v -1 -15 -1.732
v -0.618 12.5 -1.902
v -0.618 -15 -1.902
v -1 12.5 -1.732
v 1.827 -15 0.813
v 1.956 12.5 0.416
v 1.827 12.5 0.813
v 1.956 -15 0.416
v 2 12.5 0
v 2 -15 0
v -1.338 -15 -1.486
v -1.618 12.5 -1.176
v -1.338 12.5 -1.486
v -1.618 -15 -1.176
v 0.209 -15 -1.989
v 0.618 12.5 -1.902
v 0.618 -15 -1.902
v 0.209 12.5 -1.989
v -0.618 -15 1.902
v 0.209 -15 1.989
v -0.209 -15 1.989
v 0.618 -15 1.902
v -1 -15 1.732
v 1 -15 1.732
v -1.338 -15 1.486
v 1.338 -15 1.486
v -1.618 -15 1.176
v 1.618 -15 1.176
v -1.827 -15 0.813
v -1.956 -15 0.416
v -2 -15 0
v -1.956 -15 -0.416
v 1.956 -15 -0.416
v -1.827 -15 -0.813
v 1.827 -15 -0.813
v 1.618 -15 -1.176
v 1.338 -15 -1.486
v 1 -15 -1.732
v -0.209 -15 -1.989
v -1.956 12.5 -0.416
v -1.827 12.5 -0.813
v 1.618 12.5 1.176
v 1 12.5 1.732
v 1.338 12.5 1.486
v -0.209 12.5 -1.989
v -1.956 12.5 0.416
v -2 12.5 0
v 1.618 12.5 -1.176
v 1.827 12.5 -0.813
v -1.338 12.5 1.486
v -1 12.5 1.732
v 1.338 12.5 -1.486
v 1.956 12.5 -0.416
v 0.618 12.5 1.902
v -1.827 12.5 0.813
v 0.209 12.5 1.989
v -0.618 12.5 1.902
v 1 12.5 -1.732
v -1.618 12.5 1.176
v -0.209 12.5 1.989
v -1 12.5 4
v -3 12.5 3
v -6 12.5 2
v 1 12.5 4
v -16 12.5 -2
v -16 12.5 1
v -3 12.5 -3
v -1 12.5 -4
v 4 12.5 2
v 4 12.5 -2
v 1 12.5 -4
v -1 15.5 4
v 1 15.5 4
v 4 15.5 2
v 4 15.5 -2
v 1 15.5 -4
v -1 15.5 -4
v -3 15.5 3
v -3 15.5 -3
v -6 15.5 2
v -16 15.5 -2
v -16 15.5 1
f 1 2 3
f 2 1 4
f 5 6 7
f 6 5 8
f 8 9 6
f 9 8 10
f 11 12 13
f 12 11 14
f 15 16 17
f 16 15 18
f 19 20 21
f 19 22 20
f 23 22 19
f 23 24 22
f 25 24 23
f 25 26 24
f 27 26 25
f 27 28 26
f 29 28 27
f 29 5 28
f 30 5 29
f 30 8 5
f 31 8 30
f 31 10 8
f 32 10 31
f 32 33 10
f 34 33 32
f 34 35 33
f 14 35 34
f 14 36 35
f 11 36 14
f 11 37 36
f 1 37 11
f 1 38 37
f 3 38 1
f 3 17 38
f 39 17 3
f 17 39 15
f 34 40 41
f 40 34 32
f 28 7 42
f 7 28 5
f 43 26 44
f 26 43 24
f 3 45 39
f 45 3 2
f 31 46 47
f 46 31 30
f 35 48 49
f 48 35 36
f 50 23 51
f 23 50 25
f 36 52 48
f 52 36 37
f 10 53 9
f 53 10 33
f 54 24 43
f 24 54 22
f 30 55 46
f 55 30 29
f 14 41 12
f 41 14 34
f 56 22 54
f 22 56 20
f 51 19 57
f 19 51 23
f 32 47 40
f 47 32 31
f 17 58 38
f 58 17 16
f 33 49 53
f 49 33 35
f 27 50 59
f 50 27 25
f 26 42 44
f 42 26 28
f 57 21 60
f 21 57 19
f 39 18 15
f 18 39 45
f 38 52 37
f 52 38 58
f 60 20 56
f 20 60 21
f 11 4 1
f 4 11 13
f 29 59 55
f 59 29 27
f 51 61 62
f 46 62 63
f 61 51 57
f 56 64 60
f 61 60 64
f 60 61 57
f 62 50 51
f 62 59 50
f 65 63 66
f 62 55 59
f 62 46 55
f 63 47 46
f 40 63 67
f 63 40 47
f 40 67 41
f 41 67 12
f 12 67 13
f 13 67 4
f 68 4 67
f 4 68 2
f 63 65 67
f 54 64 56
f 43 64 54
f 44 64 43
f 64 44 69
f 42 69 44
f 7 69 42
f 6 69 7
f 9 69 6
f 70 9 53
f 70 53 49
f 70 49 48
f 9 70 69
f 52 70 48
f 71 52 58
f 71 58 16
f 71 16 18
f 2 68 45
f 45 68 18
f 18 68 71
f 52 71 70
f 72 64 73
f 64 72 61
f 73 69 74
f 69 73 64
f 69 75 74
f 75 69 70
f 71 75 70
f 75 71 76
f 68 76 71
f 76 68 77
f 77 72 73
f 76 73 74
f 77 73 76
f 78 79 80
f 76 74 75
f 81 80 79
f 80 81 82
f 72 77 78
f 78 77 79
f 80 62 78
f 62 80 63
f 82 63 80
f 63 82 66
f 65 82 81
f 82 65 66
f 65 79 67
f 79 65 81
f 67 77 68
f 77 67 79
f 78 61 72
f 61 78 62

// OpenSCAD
module Lever_Handle(){

    color("white")
       rotate([90,0,0])  
       translate([0,0,0])
       cylinder(30,2,2, $fn = 30, center = true); 
      
     
    color("gray")
    translate([-1,14,-1])
    rotate([90,0,0])
    linear_extrude(3, scale = 1, center = true)
    polygon(points=[[0,-3],[2,-3],[5,-1],[5,0],[5,3],[2,5],[0,5]]);


    color("gray")
    translate([-1,14,1])
    rotate([90,180,0])
    linear_extrude(3, scale = 1, center = true)
    polygon(points=[[0,-3],[2,-2],[5,-1],[15,0],[15,3],[2,4],[0,5]]);

}

Lever_Handle();

// Written by Nicolì Angelo (Gengio) 2024: 
// MIT License

//Permission is hereby granted, free of charge, to any person obtaining a copy of this software and associated documentation files (the "Software"), to deal in the Software without restriction, including without limitation the rights to use, copy, modify, merge, publish, distribute, sublicense, and/or sell copies of the Software, and to permit persons to whom the Software is furnished to do so, subject to the following conditions:

//The above copyright notice and this permission notice shall be included in all copies or substantial portions of the Software.

//THE SOFTWARE IS PROVIDED "AS IS", WITHOUT WARRANTY OF ANY KIND, EXPRESS OR IMPLIED, INCLUDING BUT NOT LIMITED TO THE WARRANTIES OF MERCHANTABILITY, FITNESS FOR A PARTICULAR PURPOSE AND NONINFRINGEMENT. IN NO EVENT SHALL THE AUTHORS OR COPYRIGHT HOLDERS BE LIABLE FOR ANY CLAIM, DAMAGES OR OTHER LIABILITY, WHETHER IN AN ACTION OF CONTRACT, TORT OR OTHERWISE, ARISING FROM, OUT OF OR IN CONNECTION WITH THE SOFTWARE OR THE USE OR OTHER DEALINGS IN THE SOFTWARE.
